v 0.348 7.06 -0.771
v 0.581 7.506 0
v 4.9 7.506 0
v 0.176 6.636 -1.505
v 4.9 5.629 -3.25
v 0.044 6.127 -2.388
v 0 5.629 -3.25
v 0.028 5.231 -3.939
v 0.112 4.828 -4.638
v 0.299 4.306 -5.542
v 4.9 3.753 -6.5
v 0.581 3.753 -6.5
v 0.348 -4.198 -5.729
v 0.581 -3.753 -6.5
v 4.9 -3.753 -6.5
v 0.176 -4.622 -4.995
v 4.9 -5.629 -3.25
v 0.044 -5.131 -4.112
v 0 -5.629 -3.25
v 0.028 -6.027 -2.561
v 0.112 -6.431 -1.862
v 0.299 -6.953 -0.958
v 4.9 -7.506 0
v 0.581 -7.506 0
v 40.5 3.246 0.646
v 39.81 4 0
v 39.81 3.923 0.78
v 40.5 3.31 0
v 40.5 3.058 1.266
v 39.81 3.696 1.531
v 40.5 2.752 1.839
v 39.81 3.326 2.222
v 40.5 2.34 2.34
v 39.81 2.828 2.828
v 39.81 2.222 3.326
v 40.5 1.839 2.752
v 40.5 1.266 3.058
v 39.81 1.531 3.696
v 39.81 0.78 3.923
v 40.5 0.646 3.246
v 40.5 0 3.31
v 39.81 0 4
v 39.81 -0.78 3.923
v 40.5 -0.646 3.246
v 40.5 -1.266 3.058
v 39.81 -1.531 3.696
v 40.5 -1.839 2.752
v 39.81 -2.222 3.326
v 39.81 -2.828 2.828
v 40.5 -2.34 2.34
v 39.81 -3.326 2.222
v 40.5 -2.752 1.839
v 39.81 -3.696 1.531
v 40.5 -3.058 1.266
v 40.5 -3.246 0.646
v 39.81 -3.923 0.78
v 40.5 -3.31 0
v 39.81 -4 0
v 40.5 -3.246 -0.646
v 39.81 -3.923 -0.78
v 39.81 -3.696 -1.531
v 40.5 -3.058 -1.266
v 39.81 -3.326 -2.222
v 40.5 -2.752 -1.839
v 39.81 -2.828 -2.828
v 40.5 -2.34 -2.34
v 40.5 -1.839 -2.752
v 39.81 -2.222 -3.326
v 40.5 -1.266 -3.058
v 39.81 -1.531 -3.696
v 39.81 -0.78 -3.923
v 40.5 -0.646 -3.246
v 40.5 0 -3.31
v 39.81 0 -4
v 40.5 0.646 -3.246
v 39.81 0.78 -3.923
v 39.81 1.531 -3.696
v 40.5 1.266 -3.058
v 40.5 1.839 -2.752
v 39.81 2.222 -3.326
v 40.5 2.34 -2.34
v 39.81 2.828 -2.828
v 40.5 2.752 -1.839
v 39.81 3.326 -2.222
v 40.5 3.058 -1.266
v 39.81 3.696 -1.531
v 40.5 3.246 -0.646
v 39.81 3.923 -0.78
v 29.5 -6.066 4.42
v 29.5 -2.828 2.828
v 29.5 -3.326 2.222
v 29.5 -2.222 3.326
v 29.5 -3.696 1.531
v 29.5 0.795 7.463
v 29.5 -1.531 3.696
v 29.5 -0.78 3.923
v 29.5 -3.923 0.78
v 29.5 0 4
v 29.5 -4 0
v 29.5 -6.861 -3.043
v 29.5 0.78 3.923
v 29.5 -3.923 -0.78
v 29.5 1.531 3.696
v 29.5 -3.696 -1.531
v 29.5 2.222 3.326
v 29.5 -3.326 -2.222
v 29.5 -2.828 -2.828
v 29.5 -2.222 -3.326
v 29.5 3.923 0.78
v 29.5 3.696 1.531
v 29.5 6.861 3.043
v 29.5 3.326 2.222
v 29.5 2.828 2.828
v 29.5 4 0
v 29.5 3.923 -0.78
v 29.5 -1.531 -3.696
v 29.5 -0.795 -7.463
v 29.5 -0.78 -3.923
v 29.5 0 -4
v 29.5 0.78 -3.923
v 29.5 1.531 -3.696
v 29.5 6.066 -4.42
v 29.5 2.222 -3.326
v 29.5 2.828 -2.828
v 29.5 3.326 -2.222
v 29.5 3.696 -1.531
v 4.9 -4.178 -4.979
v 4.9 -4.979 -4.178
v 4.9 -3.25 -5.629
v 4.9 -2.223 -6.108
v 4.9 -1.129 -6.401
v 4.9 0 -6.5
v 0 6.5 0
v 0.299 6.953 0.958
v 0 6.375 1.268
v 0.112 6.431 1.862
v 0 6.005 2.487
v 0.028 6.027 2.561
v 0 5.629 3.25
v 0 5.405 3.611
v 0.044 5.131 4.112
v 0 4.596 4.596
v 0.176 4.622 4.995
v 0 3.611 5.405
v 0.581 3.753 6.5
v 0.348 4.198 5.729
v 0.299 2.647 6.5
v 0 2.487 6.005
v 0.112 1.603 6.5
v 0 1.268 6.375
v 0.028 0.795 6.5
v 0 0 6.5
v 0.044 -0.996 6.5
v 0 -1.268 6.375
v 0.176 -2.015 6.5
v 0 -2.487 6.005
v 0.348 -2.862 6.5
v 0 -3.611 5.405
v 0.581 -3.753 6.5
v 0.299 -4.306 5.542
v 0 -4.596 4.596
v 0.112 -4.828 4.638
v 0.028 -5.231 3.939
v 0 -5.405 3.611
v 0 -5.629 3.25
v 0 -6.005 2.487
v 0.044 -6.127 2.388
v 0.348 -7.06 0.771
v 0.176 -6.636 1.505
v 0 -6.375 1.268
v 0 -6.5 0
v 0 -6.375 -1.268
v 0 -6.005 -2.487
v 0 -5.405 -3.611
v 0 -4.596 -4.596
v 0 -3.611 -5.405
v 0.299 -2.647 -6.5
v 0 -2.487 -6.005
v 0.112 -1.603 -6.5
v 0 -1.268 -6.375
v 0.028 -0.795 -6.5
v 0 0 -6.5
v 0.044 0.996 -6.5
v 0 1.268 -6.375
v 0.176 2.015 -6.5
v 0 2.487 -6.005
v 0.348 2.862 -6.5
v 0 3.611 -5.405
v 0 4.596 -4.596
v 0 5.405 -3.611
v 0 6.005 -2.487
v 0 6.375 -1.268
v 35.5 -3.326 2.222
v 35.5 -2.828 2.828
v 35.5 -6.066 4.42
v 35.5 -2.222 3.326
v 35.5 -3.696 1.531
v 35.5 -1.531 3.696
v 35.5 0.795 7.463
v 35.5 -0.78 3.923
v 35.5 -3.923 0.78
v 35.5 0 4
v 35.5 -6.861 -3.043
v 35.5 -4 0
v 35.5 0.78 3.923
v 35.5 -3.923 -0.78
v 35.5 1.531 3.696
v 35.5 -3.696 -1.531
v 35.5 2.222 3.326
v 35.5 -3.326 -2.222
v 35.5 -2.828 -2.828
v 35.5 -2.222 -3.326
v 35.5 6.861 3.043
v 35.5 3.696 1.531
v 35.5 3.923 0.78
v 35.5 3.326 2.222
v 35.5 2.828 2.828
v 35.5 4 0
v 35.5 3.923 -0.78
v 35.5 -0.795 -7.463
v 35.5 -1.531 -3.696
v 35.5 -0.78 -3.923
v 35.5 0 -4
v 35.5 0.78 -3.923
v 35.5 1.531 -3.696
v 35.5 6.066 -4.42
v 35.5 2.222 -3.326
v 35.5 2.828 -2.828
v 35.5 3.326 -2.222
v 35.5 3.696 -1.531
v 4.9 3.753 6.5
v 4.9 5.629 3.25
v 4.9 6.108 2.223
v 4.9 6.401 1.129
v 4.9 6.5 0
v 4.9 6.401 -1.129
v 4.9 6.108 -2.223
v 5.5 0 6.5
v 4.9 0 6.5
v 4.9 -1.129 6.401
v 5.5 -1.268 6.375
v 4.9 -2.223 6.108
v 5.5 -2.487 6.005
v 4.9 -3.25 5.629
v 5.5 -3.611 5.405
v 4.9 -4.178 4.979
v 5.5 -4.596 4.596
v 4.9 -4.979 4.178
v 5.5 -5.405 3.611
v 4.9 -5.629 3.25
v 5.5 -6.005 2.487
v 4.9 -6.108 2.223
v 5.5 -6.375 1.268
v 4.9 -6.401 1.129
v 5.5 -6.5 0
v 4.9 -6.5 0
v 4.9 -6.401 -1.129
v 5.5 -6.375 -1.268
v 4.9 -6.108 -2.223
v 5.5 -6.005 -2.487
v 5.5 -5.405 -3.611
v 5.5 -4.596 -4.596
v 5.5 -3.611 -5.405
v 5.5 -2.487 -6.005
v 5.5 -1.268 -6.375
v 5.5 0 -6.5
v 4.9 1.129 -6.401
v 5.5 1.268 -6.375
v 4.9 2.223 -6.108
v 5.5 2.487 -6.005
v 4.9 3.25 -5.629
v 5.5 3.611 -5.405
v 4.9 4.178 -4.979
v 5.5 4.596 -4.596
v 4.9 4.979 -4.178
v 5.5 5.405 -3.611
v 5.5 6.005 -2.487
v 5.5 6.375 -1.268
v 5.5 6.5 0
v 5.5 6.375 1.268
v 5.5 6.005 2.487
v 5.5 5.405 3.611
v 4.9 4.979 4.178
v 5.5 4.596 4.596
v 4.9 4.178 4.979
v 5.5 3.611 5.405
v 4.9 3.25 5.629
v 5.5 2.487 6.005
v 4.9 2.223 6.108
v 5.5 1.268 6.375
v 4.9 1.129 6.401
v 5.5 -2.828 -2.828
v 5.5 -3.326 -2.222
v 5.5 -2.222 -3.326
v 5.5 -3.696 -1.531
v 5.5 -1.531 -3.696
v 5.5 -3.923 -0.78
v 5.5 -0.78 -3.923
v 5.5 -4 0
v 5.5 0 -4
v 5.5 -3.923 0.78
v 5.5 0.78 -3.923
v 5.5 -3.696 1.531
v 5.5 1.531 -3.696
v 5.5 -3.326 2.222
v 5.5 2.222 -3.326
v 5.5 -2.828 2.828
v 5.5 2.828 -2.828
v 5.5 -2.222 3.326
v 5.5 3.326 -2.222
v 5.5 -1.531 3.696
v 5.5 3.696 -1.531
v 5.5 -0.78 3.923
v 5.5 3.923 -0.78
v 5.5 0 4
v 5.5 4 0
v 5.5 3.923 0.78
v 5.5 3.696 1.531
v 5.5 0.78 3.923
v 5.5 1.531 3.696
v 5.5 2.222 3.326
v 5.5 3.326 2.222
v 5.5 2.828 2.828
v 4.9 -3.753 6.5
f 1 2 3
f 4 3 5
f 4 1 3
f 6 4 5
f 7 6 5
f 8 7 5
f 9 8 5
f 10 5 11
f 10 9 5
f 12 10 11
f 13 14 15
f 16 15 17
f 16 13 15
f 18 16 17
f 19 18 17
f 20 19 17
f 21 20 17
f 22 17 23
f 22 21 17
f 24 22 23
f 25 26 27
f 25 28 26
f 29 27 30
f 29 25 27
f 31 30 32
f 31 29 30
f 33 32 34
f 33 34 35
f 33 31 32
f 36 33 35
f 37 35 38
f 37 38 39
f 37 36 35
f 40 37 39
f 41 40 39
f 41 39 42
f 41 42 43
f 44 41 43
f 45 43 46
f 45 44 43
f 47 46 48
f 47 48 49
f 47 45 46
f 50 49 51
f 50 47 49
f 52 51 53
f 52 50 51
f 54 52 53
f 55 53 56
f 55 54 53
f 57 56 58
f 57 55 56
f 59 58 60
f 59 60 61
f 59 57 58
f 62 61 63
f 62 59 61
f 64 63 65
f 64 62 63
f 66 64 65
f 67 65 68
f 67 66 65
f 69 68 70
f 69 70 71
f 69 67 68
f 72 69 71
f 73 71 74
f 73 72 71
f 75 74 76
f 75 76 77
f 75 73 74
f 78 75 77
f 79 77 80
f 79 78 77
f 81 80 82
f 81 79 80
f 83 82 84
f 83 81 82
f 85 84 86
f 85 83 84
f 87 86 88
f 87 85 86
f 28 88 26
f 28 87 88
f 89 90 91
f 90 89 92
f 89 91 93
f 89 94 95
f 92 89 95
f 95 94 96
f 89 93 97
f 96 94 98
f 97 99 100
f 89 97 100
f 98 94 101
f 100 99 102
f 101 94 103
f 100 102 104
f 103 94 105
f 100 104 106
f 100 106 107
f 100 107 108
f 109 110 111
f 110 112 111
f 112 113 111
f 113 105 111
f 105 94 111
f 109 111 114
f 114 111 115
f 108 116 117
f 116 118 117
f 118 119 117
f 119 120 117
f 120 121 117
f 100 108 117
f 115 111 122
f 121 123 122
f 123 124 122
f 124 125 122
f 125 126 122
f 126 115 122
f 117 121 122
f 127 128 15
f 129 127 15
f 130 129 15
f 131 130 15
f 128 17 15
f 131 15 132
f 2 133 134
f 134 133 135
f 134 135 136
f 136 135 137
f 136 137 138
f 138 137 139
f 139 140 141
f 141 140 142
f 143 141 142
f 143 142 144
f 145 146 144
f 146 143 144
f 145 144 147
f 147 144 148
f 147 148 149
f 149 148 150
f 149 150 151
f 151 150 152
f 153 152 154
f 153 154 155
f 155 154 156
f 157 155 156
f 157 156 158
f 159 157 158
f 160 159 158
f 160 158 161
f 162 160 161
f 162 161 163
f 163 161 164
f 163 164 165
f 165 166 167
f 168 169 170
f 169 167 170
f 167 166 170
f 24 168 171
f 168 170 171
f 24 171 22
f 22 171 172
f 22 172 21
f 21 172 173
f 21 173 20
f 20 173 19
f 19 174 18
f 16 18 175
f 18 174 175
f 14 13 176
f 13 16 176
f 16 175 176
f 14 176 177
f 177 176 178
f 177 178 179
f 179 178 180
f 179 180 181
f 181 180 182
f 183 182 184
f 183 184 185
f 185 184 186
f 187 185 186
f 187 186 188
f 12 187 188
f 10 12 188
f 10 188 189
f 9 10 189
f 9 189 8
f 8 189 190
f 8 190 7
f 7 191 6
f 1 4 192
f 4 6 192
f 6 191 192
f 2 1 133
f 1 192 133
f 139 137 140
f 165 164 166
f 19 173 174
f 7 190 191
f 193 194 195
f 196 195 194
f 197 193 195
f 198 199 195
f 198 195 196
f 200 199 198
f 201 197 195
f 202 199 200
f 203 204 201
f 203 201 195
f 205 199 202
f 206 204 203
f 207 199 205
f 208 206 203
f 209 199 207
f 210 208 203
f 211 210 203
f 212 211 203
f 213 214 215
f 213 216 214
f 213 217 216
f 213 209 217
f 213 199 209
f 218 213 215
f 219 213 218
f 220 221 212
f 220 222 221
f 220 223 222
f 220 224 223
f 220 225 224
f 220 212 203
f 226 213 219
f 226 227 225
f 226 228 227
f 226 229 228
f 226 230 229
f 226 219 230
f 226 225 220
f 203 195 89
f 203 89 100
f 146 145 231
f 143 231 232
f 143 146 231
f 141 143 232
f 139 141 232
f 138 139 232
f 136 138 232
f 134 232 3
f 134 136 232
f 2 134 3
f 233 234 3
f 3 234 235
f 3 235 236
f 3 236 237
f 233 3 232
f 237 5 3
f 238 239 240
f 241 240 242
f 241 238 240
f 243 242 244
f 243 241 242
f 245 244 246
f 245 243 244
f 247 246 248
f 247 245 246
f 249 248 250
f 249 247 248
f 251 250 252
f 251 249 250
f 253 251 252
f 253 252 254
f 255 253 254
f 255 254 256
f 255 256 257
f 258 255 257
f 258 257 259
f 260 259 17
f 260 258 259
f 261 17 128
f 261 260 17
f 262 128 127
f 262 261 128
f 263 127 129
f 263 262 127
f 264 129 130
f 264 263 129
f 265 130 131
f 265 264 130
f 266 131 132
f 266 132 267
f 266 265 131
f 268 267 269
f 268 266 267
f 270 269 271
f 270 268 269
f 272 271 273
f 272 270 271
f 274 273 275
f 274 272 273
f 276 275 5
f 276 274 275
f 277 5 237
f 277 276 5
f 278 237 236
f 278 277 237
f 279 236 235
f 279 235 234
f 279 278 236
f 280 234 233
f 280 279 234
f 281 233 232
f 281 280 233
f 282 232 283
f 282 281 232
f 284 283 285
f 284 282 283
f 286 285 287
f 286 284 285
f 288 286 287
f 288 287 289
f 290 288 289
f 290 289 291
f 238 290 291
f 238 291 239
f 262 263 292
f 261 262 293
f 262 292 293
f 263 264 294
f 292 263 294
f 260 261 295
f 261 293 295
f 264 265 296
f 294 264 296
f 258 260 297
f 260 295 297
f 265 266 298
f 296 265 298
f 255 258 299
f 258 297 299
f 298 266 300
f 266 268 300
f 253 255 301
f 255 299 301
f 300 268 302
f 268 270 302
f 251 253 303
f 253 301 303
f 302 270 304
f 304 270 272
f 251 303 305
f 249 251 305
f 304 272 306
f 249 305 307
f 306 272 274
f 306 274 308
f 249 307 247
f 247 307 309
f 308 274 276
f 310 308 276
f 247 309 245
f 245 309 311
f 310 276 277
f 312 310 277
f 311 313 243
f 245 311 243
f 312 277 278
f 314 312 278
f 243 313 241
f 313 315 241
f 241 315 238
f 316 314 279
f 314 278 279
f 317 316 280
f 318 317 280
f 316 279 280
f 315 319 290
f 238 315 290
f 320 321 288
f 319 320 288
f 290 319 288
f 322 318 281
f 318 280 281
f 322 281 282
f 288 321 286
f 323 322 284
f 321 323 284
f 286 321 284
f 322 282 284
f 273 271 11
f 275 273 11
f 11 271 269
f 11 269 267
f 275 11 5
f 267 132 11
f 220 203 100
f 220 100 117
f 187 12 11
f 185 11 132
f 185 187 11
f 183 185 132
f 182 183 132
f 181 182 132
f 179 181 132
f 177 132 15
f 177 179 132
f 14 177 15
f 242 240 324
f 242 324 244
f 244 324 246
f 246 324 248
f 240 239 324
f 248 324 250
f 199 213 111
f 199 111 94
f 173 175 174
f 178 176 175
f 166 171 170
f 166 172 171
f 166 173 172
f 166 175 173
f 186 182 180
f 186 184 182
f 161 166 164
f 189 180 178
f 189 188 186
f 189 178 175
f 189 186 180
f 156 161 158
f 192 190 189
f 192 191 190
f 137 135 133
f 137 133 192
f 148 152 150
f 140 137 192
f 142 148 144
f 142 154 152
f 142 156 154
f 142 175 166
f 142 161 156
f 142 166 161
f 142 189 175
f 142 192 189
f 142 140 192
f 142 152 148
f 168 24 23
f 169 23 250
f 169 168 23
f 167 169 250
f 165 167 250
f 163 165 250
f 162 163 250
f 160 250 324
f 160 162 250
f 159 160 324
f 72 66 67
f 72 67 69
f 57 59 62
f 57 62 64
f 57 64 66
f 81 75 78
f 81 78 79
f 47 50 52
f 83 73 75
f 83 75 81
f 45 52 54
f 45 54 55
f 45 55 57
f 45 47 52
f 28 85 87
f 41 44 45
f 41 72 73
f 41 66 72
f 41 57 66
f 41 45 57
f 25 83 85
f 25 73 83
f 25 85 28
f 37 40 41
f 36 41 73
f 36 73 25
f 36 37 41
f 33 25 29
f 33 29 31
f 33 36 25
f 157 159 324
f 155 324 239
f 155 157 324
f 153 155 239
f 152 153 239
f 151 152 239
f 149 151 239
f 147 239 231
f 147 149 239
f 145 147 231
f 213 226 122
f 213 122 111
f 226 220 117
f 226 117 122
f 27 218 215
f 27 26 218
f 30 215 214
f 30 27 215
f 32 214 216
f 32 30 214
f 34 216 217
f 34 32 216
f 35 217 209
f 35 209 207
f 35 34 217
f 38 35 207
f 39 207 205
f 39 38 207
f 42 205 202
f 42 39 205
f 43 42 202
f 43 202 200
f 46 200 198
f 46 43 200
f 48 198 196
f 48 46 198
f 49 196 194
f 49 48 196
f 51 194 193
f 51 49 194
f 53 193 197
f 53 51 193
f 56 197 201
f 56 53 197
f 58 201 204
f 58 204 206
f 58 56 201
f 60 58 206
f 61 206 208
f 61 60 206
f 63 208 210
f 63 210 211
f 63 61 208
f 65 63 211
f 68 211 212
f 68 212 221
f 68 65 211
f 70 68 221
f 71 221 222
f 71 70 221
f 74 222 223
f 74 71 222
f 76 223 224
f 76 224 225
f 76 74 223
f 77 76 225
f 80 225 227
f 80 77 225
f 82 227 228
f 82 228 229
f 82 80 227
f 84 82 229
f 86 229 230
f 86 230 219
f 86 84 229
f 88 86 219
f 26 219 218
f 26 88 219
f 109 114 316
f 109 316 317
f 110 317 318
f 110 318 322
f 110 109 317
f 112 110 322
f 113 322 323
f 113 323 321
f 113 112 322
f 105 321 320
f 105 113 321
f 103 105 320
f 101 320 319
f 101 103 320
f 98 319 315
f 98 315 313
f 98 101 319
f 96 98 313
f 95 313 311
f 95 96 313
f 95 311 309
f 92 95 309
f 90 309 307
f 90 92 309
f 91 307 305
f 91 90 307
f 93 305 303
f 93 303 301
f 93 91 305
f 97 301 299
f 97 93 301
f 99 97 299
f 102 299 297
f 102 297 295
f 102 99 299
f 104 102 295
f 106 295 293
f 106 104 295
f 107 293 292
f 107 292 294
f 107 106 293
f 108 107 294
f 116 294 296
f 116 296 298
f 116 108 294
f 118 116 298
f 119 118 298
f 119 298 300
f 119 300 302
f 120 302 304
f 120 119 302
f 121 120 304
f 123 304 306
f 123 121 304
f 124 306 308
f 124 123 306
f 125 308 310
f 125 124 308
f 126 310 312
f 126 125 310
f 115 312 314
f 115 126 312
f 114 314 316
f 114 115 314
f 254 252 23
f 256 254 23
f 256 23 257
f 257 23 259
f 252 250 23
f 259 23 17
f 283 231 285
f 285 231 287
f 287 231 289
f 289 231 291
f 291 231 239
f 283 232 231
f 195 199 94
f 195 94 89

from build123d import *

# Parameters (mm, degrees)
BASEHEAD_DEPTH      = 5.5
SKETCH4_W           = 0.6
SKETCH4_H           = 11.005553499
BOSS_EXTRUDE1_DEPTH = 6


# Read off the part's stored shape, not the designer's step: HeadChamfer
with BuildPart() as part:
    # Sketch1 → BaseHead (new body)
    with BuildSketch(Plane(origin=(0, 0, 0), x_dir=(0, 0, -1), z_dir=(1, 0, 0))):
        Polygon((6.5, 3.75277675), (6.5, -3.75277675), (0, -7.505553499), (-6.5, -3.75277675), (-6.5, 3.75277675), (0, 7.505553499), align=None)
    extrude(amount=BASEHEAD_DEPTH)

    # HeadChamfer outline → HeadChamfer (revolve, cut)
    with BuildSketch(Plane.YX):
        Polygon((7.505553503, 0.580556586), (6.499999425, -3.32e-07), (7.505553503, -1.347e-06), align=None)
    revolve(axis=Axis((0, 0, 0), (1, 0, 0)), mode=Mode.SUBTRACT)

    # HeadChamfer 2 outline → HeadChamfer 2 (revolve)
    with BuildSketch(Plane.YX):
        Polygon((4, 5.5), (4, 39.8095), (3.3095, 40.5), (0, 40.5), (0, 5.5), align=None)
    revolve(axis=Axis((0, 0, 0), (1, 0, 0)))

    # Sketch4 → BearingFace (revolve, cut)
    with BuildSketch(Plane.XY, mode=Mode.PRIVATE) as bearingface_sk:
        with Locations((5.2, 12.00277675)):
            Rectangle(SKETCH4_W, SKETCH4_H)
    revolve(bearingface_sk.sketch.rotate(Axis((0, 0, 0), (1, 0, 0)), 90), axis=Axis((0, 0, 0), (1, 0, 0)), mode=Mode.SUBTRACT)

    # Sketch5 → Boss-Extrude1 (add)
    with BuildSketch(Plane(origin=(35.5, 0, 0), x_dir=(0, 0, -1), z_dir=(1, 0, 0))):
        Polygon((-3.043097903, 6.86096848), (-7.46332195, 0.79508415), (-4.420224047, -6.06588433), (3.043097903, -6.86096848), (7.46332195, -0.79508415), (4.420224047, 6.06588433), align=None)
    extrude(amount=-BOSS_EXTRUDE1_DEPTH)


solid = part.part
